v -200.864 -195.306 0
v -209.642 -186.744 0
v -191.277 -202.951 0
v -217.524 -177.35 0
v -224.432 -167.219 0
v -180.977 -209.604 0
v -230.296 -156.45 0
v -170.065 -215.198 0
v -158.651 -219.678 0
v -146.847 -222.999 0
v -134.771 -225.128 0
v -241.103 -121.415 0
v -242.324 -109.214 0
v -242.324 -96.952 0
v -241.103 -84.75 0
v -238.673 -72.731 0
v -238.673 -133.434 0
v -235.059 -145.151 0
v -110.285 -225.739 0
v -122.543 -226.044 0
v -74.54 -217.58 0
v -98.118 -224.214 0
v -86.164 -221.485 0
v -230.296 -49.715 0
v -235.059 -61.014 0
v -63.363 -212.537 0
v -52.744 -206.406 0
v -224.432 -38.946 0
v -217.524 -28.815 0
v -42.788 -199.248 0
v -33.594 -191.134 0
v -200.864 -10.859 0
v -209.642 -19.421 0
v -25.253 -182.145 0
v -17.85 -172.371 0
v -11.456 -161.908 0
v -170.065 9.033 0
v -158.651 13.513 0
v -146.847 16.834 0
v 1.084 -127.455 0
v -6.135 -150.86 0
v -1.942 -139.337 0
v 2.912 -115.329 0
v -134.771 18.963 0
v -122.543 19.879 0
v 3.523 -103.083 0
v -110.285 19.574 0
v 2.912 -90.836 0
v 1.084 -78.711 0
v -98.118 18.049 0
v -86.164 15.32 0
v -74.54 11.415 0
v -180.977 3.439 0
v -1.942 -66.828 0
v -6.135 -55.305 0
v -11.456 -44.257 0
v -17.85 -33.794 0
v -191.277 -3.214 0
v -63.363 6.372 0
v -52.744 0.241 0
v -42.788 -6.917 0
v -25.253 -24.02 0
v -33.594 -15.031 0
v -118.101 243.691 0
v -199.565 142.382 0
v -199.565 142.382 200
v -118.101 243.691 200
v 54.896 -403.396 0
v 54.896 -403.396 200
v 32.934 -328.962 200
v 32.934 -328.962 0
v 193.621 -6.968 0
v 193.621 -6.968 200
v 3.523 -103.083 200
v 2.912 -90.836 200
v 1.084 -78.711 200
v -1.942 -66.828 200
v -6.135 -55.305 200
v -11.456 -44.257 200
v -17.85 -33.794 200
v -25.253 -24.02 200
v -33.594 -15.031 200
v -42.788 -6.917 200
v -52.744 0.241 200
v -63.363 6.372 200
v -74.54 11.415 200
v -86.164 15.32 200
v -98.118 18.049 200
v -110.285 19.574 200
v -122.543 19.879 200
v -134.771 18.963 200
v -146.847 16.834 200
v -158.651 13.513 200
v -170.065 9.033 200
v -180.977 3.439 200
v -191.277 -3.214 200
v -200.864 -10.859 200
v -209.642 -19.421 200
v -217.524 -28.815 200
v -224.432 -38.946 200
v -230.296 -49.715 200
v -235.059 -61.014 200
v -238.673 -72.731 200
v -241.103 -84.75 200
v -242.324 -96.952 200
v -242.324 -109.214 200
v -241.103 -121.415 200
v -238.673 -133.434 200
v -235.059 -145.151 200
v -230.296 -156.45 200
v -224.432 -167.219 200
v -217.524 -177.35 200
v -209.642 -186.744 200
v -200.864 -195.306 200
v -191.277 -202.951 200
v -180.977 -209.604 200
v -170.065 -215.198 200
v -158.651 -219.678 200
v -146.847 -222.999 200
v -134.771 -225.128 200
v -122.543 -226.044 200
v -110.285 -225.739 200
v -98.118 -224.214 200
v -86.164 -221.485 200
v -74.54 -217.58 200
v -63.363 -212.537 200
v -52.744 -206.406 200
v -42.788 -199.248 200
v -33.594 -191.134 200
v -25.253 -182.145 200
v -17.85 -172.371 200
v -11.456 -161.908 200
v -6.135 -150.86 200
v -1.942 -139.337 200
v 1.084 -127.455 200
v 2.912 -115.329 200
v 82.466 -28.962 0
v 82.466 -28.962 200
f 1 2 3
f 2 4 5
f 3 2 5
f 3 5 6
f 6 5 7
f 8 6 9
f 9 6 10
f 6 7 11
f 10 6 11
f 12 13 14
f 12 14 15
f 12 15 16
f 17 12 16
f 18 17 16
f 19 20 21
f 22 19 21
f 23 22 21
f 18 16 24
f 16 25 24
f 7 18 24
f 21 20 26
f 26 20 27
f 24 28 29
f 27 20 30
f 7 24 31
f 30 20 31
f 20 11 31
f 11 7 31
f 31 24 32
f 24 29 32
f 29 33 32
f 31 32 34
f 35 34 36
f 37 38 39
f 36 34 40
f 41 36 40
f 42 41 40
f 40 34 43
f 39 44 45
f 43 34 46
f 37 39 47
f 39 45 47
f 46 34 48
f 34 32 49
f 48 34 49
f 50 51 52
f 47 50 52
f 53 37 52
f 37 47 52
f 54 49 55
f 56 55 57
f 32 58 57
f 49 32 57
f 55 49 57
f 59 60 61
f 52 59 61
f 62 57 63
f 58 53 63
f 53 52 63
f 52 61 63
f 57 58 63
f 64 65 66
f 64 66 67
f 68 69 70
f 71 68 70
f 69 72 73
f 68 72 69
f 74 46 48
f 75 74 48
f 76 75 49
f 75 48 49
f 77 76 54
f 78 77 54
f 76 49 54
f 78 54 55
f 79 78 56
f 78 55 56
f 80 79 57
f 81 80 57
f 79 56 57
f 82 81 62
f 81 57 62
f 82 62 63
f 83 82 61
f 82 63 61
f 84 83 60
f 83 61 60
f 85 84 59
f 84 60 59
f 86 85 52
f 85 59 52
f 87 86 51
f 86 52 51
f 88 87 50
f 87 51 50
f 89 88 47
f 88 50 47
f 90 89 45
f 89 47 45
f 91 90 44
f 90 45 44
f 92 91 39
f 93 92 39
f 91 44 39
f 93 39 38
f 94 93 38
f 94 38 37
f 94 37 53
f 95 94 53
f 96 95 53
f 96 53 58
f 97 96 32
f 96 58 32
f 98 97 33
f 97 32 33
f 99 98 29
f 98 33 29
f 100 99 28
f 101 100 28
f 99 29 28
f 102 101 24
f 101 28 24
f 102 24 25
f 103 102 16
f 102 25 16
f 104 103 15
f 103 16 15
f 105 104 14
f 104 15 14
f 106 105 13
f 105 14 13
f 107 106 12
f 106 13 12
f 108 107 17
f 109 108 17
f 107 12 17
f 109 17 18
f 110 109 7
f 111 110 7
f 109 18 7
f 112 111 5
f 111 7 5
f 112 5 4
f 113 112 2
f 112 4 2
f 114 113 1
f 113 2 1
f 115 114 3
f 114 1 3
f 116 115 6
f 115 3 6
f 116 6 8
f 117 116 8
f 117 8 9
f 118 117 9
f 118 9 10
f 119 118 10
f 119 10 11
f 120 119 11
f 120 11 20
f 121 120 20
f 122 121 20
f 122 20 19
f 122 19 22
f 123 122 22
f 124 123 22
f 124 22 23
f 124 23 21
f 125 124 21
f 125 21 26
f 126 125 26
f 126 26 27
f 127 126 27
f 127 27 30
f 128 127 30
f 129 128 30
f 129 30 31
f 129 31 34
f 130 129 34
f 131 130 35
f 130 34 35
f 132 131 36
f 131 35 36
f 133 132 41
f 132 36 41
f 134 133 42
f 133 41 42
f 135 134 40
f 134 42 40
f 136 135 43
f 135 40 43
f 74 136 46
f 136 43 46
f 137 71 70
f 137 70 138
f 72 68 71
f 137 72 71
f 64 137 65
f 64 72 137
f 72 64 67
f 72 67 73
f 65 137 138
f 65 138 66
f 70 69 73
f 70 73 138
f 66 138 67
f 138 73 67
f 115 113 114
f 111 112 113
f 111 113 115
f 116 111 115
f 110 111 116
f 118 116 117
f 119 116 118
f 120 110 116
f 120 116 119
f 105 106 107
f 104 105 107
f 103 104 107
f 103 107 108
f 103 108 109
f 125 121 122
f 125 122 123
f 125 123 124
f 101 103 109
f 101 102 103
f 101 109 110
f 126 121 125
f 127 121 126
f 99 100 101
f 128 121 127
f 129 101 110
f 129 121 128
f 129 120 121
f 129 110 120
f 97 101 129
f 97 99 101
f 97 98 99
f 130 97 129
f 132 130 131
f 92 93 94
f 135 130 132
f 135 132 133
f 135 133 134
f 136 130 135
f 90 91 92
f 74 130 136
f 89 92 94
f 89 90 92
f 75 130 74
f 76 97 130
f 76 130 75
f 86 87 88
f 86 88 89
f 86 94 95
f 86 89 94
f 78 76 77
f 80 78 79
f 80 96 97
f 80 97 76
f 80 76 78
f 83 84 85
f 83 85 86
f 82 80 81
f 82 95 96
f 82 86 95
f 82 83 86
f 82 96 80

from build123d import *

# Parameters (mm, degrees)
SKETCH_1_R        = 123
EXTRUDE_1_DEPTH   = 200
EXTRUDE_1_2_DEPTH = 200


with BuildPart() as part:
    # 草图1 → 凸台-拉伸1 (new body)
    with BuildSketch(Plane.XY):
        with Locations((-119.476957208, -103.08254604)):
            Circle(SKETCH_1_R)
    extrude(amount=EXTRUDE_1_DEPTH)


with BuildPart() as body_2:
    # 草图1 → Extrude 1 2 (new body)
    with BuildSketch(Plane.XY):
        Polygon((-118.10060406, 243.691104315), (193.620746945, -6.967626489), (54.896105, -403.396023198), (32.933654212, -328.961643632), (82.466282801, -28.961643632), (-199.564691571, 142.381665239), align=None)
    extrude(amount=EXTRUDE_1_2_DEPTH)


solid = Compound([part.part, body_2.part])
